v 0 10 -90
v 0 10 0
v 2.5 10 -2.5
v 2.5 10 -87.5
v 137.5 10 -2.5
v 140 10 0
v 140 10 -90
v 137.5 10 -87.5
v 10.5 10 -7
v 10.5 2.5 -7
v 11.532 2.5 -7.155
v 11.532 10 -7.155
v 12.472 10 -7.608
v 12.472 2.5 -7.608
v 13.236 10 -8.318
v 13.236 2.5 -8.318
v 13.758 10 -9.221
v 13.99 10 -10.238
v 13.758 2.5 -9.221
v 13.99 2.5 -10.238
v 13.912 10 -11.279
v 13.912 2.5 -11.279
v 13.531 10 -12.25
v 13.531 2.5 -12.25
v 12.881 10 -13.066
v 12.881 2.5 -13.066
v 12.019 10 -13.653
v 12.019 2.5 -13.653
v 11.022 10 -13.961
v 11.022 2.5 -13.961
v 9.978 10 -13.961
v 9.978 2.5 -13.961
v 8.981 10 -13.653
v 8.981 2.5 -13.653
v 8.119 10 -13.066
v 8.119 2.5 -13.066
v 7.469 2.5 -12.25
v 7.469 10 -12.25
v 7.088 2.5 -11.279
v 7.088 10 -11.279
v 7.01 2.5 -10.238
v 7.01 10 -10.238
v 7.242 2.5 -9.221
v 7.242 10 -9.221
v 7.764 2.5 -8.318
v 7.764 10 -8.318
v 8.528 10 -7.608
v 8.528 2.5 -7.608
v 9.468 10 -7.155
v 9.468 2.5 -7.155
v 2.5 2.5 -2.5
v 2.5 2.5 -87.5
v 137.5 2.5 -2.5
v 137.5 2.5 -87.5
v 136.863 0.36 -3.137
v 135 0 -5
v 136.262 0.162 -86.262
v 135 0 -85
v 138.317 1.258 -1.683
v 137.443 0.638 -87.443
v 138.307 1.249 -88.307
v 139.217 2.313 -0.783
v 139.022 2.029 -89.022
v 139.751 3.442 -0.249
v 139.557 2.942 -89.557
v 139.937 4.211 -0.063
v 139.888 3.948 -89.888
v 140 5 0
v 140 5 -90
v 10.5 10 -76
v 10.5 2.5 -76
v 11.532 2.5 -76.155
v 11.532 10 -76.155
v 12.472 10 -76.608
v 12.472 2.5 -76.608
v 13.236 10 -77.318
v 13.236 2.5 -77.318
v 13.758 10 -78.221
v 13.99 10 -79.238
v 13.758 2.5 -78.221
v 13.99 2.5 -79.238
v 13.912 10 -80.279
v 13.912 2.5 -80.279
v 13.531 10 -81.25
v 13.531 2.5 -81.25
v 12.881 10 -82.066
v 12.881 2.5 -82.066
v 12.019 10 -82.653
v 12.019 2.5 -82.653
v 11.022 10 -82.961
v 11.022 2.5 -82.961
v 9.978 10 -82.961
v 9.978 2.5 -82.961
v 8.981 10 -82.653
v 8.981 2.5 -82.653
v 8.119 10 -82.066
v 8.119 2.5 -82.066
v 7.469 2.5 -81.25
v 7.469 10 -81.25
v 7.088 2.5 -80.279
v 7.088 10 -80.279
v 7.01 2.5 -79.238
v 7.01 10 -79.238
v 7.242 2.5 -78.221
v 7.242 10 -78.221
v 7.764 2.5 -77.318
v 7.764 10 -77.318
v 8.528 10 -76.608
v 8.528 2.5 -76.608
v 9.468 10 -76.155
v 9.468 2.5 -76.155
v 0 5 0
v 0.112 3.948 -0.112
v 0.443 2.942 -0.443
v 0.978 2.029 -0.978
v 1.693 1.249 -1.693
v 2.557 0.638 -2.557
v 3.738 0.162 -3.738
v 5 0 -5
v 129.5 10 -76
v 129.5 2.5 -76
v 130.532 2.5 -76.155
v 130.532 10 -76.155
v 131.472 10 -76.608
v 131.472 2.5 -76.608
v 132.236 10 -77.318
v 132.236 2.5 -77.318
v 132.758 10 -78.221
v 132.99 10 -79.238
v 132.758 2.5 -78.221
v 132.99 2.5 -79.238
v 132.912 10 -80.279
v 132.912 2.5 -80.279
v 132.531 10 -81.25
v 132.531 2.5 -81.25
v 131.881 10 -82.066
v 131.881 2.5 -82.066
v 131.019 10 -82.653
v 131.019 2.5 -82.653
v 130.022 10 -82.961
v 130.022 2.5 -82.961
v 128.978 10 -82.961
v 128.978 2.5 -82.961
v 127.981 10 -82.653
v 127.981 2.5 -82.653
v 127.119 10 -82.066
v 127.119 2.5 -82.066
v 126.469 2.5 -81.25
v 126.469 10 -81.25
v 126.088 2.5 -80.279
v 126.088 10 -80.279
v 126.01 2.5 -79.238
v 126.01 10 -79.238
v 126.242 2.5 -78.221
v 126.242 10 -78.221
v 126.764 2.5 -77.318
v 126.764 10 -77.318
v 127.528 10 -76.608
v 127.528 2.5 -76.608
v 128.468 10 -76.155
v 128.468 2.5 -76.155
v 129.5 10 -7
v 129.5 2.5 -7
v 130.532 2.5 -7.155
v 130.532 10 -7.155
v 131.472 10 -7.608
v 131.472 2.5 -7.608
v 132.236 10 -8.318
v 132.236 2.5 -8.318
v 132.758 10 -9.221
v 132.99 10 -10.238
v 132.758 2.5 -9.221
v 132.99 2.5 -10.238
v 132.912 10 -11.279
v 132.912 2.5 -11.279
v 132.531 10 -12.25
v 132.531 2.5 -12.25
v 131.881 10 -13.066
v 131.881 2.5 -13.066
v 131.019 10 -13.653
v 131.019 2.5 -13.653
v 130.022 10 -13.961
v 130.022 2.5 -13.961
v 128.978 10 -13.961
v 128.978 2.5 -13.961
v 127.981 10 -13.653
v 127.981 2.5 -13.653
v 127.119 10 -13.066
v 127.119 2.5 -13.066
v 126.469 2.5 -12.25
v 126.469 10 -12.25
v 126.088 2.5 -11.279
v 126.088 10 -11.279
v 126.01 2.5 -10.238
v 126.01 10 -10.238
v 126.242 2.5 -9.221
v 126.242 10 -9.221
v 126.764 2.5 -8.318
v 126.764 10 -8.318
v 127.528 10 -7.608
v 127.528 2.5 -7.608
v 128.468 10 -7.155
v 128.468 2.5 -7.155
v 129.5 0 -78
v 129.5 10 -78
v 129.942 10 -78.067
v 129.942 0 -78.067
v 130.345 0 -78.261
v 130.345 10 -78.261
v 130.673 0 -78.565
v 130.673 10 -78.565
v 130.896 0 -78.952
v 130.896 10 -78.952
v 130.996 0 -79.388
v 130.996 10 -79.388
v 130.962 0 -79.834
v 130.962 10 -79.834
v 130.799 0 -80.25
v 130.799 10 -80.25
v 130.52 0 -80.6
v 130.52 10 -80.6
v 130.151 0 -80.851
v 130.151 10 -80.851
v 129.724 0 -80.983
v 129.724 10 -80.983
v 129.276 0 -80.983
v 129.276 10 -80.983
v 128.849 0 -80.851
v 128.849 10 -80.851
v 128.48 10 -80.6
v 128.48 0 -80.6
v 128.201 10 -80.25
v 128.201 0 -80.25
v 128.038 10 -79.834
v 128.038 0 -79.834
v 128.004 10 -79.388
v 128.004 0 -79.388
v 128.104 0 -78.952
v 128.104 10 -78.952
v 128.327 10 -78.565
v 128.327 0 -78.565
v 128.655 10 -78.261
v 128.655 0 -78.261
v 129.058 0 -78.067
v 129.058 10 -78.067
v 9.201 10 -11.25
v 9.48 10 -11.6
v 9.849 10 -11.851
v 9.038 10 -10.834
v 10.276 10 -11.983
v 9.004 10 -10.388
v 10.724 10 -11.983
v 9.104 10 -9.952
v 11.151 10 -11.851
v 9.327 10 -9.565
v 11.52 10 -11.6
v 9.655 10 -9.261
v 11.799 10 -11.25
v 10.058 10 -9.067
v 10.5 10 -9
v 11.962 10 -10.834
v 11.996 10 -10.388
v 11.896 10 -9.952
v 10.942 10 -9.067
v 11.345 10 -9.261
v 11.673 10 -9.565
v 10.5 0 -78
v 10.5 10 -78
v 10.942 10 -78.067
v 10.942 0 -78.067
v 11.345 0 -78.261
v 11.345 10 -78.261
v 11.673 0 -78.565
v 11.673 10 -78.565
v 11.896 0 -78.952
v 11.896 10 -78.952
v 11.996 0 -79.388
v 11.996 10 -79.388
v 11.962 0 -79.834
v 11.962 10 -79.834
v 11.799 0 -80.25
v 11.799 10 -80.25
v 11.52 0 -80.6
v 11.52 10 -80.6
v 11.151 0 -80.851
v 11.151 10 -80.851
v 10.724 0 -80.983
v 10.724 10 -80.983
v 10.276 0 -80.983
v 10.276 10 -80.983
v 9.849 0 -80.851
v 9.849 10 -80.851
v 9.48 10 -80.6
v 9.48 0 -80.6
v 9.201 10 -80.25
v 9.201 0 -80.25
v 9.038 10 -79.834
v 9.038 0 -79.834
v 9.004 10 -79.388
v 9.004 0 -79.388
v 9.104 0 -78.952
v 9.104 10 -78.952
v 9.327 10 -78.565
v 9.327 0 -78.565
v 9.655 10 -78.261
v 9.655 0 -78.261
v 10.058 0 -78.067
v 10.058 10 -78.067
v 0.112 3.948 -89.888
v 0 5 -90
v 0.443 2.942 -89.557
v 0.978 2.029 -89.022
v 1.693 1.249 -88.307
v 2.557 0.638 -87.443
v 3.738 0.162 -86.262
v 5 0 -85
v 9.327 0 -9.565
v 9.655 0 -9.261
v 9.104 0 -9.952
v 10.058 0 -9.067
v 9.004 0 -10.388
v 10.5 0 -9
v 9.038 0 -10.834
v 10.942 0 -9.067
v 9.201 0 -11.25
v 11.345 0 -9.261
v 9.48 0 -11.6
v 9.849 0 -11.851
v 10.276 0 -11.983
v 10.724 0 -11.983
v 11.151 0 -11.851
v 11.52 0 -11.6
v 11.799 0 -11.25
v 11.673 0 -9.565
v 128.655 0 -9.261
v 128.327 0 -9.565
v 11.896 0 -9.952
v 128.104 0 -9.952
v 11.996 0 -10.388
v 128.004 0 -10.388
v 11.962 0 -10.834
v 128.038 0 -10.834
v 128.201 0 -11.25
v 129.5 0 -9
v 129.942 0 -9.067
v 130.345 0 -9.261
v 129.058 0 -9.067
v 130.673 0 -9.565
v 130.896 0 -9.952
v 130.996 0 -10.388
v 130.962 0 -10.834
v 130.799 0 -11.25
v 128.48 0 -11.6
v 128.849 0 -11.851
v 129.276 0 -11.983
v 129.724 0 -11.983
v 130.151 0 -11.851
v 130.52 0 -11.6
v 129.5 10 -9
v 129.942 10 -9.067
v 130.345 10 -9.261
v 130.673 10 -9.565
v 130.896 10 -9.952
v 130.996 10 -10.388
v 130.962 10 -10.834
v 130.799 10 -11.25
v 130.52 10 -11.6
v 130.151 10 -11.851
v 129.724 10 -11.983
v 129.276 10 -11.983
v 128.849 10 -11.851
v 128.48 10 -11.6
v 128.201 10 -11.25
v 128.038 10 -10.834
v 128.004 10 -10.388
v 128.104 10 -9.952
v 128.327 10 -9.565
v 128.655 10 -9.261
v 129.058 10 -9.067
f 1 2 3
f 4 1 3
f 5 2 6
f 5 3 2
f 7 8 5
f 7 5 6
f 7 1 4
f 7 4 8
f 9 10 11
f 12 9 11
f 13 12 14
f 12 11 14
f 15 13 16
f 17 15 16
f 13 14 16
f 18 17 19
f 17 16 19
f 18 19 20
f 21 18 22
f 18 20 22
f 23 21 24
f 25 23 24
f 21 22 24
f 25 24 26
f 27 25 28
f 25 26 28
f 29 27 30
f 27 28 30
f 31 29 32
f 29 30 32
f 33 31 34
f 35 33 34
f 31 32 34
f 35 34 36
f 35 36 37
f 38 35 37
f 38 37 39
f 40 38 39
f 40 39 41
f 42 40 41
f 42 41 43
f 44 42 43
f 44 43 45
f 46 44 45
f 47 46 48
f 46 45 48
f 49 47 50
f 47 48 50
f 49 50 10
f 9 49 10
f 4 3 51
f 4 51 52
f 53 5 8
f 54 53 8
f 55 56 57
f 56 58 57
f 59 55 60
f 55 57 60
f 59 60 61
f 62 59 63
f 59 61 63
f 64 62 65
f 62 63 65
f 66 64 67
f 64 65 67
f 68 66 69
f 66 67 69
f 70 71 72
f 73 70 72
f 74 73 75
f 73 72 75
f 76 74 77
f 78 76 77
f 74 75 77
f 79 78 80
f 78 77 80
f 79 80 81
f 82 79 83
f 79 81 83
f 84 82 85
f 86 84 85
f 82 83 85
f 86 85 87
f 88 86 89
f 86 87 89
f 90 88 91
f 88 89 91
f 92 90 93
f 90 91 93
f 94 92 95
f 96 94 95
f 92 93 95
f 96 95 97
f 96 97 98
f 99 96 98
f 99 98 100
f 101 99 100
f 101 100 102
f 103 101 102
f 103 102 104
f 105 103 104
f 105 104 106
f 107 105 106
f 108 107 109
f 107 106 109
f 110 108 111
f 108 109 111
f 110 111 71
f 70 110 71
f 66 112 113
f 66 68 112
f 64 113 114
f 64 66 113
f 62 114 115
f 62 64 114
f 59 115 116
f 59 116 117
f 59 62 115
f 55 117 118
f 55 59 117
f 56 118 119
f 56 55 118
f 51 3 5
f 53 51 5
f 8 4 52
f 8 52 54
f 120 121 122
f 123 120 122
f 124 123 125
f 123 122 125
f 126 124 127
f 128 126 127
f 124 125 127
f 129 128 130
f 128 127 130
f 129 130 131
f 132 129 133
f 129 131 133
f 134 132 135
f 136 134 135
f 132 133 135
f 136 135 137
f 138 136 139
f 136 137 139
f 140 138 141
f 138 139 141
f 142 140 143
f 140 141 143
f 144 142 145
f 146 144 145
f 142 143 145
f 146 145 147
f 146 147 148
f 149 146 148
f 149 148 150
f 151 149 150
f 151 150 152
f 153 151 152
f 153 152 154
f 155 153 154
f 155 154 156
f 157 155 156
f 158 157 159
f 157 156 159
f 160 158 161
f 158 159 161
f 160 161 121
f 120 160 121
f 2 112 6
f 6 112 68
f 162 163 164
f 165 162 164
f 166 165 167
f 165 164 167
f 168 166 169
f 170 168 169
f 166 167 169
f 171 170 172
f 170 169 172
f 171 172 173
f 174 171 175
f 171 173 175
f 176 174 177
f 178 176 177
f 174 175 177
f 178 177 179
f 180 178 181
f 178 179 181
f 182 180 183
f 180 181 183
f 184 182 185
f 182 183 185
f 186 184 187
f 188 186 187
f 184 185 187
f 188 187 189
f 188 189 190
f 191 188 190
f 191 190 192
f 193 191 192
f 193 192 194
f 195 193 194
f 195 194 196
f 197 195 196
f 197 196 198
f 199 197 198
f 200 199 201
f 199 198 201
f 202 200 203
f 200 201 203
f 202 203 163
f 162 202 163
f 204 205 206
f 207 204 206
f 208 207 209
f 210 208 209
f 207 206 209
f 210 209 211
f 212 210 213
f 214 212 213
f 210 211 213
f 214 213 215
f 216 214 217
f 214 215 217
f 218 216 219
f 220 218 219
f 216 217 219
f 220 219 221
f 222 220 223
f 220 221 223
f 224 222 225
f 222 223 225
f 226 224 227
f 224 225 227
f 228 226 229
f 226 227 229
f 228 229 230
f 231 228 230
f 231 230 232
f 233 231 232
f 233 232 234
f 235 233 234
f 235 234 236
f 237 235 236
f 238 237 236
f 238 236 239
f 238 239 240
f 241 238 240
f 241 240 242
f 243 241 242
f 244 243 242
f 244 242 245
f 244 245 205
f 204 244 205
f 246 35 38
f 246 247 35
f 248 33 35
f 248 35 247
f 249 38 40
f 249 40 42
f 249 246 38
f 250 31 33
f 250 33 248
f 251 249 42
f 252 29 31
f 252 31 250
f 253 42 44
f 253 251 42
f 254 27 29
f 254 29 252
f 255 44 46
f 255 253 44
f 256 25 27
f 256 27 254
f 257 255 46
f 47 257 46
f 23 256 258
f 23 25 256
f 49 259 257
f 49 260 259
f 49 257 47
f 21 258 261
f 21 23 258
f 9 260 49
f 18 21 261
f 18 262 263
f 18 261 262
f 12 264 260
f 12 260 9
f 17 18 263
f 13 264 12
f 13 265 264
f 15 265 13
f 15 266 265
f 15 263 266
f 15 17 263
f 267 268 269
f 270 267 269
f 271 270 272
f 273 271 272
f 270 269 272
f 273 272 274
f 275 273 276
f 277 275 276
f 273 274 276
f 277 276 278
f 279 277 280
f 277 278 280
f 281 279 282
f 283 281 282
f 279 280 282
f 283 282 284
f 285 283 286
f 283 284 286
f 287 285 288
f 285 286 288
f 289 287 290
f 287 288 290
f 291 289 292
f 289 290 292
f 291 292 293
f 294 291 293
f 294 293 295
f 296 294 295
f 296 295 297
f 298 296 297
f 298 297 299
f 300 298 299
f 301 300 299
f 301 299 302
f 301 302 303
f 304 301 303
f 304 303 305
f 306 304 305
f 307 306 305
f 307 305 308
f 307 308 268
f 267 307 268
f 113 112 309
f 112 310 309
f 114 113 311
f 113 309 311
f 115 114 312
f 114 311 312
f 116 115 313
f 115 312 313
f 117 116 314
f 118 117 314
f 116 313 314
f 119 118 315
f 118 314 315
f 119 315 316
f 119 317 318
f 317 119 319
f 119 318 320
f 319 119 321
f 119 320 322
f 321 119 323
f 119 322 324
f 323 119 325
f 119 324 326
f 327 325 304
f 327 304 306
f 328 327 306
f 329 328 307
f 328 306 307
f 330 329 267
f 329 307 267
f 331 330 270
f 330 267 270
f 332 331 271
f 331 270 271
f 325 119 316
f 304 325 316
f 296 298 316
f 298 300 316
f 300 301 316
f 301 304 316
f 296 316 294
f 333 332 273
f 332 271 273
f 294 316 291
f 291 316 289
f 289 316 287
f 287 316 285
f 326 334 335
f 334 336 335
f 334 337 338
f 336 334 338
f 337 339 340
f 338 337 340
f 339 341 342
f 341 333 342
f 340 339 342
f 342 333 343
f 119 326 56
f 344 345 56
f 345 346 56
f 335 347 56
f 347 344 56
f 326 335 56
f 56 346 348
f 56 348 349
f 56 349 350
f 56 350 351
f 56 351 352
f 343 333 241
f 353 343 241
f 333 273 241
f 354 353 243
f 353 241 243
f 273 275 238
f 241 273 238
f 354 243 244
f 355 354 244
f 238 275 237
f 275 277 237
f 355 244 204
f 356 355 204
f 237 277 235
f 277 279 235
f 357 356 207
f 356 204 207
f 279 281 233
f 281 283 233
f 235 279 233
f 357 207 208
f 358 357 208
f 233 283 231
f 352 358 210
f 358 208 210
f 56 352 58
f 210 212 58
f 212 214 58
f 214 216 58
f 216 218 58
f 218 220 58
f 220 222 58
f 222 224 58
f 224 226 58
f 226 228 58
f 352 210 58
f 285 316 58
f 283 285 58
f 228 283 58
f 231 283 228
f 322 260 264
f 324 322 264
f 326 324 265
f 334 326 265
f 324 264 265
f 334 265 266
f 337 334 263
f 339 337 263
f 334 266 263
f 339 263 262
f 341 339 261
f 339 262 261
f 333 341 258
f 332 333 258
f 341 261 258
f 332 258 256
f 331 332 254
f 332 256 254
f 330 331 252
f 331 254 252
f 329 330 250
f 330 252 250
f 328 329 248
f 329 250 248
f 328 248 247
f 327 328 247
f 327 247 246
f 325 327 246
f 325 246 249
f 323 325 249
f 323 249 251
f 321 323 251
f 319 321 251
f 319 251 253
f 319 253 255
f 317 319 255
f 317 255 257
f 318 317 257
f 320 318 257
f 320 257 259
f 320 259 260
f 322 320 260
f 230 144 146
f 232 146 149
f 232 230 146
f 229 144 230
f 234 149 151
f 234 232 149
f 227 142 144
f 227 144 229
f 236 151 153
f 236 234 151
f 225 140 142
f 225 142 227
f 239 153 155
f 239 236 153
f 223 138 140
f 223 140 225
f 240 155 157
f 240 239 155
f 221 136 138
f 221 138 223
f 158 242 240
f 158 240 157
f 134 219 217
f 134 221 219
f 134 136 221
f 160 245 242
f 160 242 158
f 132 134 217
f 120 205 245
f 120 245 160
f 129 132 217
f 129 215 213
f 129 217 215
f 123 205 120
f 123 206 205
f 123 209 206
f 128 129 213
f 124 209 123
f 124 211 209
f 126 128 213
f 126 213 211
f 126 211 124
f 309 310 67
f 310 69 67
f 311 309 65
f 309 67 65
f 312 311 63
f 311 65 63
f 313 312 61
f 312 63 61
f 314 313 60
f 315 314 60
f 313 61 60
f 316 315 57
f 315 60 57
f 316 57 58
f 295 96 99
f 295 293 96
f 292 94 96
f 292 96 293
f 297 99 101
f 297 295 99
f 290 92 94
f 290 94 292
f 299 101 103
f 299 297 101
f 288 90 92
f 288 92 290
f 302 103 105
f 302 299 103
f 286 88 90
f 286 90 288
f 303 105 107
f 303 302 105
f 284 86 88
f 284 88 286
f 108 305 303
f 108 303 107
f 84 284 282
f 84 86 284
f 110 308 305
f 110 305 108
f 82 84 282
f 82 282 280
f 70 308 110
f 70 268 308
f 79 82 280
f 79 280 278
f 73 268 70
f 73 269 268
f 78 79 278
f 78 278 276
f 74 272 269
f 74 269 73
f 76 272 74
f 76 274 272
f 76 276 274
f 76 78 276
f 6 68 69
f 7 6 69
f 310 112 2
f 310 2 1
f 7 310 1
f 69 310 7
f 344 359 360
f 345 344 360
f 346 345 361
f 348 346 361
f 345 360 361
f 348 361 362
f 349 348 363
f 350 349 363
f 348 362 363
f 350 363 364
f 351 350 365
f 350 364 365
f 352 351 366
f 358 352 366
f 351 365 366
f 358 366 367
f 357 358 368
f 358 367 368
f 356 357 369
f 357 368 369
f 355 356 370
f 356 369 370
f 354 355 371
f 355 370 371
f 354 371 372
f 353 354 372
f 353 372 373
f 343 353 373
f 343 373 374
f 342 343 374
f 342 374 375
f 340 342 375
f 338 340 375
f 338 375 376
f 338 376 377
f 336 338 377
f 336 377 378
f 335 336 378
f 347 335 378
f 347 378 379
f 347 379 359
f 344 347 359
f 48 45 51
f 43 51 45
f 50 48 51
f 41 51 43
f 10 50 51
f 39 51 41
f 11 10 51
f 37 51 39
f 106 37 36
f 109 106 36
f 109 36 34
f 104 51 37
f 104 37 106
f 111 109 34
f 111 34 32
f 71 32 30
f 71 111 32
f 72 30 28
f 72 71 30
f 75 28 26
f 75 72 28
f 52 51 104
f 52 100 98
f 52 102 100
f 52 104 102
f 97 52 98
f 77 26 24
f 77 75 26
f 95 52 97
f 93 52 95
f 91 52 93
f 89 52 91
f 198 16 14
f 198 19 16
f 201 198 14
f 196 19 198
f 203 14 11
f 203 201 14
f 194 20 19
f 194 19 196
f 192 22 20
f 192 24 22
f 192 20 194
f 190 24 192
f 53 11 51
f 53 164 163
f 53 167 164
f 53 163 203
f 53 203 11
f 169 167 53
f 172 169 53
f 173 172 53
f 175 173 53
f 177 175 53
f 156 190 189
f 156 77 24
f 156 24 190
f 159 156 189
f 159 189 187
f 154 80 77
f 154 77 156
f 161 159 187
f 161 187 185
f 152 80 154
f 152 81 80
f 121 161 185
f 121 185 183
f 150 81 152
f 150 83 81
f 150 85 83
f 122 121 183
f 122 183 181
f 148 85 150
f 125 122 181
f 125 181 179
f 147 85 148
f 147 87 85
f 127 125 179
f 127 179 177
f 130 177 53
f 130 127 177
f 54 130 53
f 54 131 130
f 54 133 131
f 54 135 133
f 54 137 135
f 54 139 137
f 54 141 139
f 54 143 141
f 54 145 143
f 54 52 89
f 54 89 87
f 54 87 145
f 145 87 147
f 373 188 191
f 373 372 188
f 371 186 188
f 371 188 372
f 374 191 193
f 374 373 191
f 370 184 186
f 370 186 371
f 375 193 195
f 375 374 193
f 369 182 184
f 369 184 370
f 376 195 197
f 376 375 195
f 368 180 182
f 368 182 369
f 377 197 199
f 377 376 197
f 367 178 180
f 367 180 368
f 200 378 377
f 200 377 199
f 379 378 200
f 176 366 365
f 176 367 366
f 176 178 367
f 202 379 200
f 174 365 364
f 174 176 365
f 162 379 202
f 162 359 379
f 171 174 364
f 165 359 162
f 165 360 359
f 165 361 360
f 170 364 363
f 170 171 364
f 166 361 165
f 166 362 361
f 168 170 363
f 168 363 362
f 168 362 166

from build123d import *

# Parameters (mm, degrees)
SKETCH1_W           = 140
SKETCH1_H           = 90
BOSS_EXTRUDE2_DEPTH = 10
SKETCH2_W           = 135
SKETCH2_H           = 85
CUT_EXTRUDE1_DEPTH  = 7.5
SKETCH4_R           = 3.5
BOSS_EXTRUDE3_DEPTH = 7.5
SKETCH5_R           = 1.5
CUT_EXTRUDE2_DEPTH  = 167.733320005
FILLET1_R           = 5


with BuildPart() as part:
    # Sketch1 → Boss-Extrude2 (new body)
    with BuildSketch(Plane(origin=(0, 0, 0), x_dir=(1, 0, 0), z_dir=(0, 1, 0))):
        with Locations((70, 45)):
            Rectangle(SKETCH1_W, SKETCH1_H)
    extrude(amount=BOSS_EXTRUDE2_DEPTH)

    # Sketch2 → Cut-Extrude1 (cut)
    with BuildSketch(Plane(origin=(0, 10, 0), x_dir=(1, 0, 0), z_dir=(0, 1, 0))):
        with Locations((70, 45)):
            Rectangle(SKETCH2_W, SKETCH2_H)
    extrude(amount=-CUT_EXTRUDE1_DEPTH, mode=Mode.SUBTRACT)

    # Sketch4 → Boss-Extrude3 (add)
    with BuildSketch(Plane(origin=(0, 2.5, 0), x_dir=(1, 0, 0), z_dir=(0, 1, 0))):
        with Locations(Location((10.5, 79.5, 0), (0, 0, 270))):
            Circle(SKETCH4_R)
        with Locations(Location((10.5, 10.5, 0), (0, 0, 270))):
            Circle(SKETCH4_R)
        with Locations(Location((129.5, 10.5, 0), (0, 0, 270))):
            Circle(SKETCH4_R)
        with Locations(Location((129.5, 79.5, 0), (0, 0, 270))):
            Circle(SKETCH4_R)
    extrude(amount=BOSS_EXTRUDE3_DEPTH)

    # Sketch5 → Cut-Extrude2 (cut, through all)
    with BuildSketch(Plane(origin=(0, 10, 0), x_dir=(1, 0, 0), z_dir=(0, 1, 0))):
        with Locations(Location((10.5, 10.5, 0), (0, 0, 270))):
            Circle(SKETCH5_R)
        with Locations(Location((10.5, 79.5, 0), (0, 0, 270))):
            Circle(SKETCH5_R)
        with Locations(Location((129.5, 79.5, 0), (0, 0, 270))):
            Circle(SKETCH5_R)
        with Locations(Location((129.5, 10.5, 0), (0, 0, 270))):
            Circle(SKETCH5_R)
    extrude(amount=-CUT_EXTRUDE2_DEPTH, mode=Mode.SUBTRACT)

    # Fillet1
    fillet1_edges = [part.edges().sort_by_distance(p)[0] for p in [
        (70, 0, -90),
        (140, 0, -45),
        (70, 0, 0),
        (0, 0, -45),
    ]]
    fillet(fillet1_edges, radius=FILLET1_R)


solid = part.part
